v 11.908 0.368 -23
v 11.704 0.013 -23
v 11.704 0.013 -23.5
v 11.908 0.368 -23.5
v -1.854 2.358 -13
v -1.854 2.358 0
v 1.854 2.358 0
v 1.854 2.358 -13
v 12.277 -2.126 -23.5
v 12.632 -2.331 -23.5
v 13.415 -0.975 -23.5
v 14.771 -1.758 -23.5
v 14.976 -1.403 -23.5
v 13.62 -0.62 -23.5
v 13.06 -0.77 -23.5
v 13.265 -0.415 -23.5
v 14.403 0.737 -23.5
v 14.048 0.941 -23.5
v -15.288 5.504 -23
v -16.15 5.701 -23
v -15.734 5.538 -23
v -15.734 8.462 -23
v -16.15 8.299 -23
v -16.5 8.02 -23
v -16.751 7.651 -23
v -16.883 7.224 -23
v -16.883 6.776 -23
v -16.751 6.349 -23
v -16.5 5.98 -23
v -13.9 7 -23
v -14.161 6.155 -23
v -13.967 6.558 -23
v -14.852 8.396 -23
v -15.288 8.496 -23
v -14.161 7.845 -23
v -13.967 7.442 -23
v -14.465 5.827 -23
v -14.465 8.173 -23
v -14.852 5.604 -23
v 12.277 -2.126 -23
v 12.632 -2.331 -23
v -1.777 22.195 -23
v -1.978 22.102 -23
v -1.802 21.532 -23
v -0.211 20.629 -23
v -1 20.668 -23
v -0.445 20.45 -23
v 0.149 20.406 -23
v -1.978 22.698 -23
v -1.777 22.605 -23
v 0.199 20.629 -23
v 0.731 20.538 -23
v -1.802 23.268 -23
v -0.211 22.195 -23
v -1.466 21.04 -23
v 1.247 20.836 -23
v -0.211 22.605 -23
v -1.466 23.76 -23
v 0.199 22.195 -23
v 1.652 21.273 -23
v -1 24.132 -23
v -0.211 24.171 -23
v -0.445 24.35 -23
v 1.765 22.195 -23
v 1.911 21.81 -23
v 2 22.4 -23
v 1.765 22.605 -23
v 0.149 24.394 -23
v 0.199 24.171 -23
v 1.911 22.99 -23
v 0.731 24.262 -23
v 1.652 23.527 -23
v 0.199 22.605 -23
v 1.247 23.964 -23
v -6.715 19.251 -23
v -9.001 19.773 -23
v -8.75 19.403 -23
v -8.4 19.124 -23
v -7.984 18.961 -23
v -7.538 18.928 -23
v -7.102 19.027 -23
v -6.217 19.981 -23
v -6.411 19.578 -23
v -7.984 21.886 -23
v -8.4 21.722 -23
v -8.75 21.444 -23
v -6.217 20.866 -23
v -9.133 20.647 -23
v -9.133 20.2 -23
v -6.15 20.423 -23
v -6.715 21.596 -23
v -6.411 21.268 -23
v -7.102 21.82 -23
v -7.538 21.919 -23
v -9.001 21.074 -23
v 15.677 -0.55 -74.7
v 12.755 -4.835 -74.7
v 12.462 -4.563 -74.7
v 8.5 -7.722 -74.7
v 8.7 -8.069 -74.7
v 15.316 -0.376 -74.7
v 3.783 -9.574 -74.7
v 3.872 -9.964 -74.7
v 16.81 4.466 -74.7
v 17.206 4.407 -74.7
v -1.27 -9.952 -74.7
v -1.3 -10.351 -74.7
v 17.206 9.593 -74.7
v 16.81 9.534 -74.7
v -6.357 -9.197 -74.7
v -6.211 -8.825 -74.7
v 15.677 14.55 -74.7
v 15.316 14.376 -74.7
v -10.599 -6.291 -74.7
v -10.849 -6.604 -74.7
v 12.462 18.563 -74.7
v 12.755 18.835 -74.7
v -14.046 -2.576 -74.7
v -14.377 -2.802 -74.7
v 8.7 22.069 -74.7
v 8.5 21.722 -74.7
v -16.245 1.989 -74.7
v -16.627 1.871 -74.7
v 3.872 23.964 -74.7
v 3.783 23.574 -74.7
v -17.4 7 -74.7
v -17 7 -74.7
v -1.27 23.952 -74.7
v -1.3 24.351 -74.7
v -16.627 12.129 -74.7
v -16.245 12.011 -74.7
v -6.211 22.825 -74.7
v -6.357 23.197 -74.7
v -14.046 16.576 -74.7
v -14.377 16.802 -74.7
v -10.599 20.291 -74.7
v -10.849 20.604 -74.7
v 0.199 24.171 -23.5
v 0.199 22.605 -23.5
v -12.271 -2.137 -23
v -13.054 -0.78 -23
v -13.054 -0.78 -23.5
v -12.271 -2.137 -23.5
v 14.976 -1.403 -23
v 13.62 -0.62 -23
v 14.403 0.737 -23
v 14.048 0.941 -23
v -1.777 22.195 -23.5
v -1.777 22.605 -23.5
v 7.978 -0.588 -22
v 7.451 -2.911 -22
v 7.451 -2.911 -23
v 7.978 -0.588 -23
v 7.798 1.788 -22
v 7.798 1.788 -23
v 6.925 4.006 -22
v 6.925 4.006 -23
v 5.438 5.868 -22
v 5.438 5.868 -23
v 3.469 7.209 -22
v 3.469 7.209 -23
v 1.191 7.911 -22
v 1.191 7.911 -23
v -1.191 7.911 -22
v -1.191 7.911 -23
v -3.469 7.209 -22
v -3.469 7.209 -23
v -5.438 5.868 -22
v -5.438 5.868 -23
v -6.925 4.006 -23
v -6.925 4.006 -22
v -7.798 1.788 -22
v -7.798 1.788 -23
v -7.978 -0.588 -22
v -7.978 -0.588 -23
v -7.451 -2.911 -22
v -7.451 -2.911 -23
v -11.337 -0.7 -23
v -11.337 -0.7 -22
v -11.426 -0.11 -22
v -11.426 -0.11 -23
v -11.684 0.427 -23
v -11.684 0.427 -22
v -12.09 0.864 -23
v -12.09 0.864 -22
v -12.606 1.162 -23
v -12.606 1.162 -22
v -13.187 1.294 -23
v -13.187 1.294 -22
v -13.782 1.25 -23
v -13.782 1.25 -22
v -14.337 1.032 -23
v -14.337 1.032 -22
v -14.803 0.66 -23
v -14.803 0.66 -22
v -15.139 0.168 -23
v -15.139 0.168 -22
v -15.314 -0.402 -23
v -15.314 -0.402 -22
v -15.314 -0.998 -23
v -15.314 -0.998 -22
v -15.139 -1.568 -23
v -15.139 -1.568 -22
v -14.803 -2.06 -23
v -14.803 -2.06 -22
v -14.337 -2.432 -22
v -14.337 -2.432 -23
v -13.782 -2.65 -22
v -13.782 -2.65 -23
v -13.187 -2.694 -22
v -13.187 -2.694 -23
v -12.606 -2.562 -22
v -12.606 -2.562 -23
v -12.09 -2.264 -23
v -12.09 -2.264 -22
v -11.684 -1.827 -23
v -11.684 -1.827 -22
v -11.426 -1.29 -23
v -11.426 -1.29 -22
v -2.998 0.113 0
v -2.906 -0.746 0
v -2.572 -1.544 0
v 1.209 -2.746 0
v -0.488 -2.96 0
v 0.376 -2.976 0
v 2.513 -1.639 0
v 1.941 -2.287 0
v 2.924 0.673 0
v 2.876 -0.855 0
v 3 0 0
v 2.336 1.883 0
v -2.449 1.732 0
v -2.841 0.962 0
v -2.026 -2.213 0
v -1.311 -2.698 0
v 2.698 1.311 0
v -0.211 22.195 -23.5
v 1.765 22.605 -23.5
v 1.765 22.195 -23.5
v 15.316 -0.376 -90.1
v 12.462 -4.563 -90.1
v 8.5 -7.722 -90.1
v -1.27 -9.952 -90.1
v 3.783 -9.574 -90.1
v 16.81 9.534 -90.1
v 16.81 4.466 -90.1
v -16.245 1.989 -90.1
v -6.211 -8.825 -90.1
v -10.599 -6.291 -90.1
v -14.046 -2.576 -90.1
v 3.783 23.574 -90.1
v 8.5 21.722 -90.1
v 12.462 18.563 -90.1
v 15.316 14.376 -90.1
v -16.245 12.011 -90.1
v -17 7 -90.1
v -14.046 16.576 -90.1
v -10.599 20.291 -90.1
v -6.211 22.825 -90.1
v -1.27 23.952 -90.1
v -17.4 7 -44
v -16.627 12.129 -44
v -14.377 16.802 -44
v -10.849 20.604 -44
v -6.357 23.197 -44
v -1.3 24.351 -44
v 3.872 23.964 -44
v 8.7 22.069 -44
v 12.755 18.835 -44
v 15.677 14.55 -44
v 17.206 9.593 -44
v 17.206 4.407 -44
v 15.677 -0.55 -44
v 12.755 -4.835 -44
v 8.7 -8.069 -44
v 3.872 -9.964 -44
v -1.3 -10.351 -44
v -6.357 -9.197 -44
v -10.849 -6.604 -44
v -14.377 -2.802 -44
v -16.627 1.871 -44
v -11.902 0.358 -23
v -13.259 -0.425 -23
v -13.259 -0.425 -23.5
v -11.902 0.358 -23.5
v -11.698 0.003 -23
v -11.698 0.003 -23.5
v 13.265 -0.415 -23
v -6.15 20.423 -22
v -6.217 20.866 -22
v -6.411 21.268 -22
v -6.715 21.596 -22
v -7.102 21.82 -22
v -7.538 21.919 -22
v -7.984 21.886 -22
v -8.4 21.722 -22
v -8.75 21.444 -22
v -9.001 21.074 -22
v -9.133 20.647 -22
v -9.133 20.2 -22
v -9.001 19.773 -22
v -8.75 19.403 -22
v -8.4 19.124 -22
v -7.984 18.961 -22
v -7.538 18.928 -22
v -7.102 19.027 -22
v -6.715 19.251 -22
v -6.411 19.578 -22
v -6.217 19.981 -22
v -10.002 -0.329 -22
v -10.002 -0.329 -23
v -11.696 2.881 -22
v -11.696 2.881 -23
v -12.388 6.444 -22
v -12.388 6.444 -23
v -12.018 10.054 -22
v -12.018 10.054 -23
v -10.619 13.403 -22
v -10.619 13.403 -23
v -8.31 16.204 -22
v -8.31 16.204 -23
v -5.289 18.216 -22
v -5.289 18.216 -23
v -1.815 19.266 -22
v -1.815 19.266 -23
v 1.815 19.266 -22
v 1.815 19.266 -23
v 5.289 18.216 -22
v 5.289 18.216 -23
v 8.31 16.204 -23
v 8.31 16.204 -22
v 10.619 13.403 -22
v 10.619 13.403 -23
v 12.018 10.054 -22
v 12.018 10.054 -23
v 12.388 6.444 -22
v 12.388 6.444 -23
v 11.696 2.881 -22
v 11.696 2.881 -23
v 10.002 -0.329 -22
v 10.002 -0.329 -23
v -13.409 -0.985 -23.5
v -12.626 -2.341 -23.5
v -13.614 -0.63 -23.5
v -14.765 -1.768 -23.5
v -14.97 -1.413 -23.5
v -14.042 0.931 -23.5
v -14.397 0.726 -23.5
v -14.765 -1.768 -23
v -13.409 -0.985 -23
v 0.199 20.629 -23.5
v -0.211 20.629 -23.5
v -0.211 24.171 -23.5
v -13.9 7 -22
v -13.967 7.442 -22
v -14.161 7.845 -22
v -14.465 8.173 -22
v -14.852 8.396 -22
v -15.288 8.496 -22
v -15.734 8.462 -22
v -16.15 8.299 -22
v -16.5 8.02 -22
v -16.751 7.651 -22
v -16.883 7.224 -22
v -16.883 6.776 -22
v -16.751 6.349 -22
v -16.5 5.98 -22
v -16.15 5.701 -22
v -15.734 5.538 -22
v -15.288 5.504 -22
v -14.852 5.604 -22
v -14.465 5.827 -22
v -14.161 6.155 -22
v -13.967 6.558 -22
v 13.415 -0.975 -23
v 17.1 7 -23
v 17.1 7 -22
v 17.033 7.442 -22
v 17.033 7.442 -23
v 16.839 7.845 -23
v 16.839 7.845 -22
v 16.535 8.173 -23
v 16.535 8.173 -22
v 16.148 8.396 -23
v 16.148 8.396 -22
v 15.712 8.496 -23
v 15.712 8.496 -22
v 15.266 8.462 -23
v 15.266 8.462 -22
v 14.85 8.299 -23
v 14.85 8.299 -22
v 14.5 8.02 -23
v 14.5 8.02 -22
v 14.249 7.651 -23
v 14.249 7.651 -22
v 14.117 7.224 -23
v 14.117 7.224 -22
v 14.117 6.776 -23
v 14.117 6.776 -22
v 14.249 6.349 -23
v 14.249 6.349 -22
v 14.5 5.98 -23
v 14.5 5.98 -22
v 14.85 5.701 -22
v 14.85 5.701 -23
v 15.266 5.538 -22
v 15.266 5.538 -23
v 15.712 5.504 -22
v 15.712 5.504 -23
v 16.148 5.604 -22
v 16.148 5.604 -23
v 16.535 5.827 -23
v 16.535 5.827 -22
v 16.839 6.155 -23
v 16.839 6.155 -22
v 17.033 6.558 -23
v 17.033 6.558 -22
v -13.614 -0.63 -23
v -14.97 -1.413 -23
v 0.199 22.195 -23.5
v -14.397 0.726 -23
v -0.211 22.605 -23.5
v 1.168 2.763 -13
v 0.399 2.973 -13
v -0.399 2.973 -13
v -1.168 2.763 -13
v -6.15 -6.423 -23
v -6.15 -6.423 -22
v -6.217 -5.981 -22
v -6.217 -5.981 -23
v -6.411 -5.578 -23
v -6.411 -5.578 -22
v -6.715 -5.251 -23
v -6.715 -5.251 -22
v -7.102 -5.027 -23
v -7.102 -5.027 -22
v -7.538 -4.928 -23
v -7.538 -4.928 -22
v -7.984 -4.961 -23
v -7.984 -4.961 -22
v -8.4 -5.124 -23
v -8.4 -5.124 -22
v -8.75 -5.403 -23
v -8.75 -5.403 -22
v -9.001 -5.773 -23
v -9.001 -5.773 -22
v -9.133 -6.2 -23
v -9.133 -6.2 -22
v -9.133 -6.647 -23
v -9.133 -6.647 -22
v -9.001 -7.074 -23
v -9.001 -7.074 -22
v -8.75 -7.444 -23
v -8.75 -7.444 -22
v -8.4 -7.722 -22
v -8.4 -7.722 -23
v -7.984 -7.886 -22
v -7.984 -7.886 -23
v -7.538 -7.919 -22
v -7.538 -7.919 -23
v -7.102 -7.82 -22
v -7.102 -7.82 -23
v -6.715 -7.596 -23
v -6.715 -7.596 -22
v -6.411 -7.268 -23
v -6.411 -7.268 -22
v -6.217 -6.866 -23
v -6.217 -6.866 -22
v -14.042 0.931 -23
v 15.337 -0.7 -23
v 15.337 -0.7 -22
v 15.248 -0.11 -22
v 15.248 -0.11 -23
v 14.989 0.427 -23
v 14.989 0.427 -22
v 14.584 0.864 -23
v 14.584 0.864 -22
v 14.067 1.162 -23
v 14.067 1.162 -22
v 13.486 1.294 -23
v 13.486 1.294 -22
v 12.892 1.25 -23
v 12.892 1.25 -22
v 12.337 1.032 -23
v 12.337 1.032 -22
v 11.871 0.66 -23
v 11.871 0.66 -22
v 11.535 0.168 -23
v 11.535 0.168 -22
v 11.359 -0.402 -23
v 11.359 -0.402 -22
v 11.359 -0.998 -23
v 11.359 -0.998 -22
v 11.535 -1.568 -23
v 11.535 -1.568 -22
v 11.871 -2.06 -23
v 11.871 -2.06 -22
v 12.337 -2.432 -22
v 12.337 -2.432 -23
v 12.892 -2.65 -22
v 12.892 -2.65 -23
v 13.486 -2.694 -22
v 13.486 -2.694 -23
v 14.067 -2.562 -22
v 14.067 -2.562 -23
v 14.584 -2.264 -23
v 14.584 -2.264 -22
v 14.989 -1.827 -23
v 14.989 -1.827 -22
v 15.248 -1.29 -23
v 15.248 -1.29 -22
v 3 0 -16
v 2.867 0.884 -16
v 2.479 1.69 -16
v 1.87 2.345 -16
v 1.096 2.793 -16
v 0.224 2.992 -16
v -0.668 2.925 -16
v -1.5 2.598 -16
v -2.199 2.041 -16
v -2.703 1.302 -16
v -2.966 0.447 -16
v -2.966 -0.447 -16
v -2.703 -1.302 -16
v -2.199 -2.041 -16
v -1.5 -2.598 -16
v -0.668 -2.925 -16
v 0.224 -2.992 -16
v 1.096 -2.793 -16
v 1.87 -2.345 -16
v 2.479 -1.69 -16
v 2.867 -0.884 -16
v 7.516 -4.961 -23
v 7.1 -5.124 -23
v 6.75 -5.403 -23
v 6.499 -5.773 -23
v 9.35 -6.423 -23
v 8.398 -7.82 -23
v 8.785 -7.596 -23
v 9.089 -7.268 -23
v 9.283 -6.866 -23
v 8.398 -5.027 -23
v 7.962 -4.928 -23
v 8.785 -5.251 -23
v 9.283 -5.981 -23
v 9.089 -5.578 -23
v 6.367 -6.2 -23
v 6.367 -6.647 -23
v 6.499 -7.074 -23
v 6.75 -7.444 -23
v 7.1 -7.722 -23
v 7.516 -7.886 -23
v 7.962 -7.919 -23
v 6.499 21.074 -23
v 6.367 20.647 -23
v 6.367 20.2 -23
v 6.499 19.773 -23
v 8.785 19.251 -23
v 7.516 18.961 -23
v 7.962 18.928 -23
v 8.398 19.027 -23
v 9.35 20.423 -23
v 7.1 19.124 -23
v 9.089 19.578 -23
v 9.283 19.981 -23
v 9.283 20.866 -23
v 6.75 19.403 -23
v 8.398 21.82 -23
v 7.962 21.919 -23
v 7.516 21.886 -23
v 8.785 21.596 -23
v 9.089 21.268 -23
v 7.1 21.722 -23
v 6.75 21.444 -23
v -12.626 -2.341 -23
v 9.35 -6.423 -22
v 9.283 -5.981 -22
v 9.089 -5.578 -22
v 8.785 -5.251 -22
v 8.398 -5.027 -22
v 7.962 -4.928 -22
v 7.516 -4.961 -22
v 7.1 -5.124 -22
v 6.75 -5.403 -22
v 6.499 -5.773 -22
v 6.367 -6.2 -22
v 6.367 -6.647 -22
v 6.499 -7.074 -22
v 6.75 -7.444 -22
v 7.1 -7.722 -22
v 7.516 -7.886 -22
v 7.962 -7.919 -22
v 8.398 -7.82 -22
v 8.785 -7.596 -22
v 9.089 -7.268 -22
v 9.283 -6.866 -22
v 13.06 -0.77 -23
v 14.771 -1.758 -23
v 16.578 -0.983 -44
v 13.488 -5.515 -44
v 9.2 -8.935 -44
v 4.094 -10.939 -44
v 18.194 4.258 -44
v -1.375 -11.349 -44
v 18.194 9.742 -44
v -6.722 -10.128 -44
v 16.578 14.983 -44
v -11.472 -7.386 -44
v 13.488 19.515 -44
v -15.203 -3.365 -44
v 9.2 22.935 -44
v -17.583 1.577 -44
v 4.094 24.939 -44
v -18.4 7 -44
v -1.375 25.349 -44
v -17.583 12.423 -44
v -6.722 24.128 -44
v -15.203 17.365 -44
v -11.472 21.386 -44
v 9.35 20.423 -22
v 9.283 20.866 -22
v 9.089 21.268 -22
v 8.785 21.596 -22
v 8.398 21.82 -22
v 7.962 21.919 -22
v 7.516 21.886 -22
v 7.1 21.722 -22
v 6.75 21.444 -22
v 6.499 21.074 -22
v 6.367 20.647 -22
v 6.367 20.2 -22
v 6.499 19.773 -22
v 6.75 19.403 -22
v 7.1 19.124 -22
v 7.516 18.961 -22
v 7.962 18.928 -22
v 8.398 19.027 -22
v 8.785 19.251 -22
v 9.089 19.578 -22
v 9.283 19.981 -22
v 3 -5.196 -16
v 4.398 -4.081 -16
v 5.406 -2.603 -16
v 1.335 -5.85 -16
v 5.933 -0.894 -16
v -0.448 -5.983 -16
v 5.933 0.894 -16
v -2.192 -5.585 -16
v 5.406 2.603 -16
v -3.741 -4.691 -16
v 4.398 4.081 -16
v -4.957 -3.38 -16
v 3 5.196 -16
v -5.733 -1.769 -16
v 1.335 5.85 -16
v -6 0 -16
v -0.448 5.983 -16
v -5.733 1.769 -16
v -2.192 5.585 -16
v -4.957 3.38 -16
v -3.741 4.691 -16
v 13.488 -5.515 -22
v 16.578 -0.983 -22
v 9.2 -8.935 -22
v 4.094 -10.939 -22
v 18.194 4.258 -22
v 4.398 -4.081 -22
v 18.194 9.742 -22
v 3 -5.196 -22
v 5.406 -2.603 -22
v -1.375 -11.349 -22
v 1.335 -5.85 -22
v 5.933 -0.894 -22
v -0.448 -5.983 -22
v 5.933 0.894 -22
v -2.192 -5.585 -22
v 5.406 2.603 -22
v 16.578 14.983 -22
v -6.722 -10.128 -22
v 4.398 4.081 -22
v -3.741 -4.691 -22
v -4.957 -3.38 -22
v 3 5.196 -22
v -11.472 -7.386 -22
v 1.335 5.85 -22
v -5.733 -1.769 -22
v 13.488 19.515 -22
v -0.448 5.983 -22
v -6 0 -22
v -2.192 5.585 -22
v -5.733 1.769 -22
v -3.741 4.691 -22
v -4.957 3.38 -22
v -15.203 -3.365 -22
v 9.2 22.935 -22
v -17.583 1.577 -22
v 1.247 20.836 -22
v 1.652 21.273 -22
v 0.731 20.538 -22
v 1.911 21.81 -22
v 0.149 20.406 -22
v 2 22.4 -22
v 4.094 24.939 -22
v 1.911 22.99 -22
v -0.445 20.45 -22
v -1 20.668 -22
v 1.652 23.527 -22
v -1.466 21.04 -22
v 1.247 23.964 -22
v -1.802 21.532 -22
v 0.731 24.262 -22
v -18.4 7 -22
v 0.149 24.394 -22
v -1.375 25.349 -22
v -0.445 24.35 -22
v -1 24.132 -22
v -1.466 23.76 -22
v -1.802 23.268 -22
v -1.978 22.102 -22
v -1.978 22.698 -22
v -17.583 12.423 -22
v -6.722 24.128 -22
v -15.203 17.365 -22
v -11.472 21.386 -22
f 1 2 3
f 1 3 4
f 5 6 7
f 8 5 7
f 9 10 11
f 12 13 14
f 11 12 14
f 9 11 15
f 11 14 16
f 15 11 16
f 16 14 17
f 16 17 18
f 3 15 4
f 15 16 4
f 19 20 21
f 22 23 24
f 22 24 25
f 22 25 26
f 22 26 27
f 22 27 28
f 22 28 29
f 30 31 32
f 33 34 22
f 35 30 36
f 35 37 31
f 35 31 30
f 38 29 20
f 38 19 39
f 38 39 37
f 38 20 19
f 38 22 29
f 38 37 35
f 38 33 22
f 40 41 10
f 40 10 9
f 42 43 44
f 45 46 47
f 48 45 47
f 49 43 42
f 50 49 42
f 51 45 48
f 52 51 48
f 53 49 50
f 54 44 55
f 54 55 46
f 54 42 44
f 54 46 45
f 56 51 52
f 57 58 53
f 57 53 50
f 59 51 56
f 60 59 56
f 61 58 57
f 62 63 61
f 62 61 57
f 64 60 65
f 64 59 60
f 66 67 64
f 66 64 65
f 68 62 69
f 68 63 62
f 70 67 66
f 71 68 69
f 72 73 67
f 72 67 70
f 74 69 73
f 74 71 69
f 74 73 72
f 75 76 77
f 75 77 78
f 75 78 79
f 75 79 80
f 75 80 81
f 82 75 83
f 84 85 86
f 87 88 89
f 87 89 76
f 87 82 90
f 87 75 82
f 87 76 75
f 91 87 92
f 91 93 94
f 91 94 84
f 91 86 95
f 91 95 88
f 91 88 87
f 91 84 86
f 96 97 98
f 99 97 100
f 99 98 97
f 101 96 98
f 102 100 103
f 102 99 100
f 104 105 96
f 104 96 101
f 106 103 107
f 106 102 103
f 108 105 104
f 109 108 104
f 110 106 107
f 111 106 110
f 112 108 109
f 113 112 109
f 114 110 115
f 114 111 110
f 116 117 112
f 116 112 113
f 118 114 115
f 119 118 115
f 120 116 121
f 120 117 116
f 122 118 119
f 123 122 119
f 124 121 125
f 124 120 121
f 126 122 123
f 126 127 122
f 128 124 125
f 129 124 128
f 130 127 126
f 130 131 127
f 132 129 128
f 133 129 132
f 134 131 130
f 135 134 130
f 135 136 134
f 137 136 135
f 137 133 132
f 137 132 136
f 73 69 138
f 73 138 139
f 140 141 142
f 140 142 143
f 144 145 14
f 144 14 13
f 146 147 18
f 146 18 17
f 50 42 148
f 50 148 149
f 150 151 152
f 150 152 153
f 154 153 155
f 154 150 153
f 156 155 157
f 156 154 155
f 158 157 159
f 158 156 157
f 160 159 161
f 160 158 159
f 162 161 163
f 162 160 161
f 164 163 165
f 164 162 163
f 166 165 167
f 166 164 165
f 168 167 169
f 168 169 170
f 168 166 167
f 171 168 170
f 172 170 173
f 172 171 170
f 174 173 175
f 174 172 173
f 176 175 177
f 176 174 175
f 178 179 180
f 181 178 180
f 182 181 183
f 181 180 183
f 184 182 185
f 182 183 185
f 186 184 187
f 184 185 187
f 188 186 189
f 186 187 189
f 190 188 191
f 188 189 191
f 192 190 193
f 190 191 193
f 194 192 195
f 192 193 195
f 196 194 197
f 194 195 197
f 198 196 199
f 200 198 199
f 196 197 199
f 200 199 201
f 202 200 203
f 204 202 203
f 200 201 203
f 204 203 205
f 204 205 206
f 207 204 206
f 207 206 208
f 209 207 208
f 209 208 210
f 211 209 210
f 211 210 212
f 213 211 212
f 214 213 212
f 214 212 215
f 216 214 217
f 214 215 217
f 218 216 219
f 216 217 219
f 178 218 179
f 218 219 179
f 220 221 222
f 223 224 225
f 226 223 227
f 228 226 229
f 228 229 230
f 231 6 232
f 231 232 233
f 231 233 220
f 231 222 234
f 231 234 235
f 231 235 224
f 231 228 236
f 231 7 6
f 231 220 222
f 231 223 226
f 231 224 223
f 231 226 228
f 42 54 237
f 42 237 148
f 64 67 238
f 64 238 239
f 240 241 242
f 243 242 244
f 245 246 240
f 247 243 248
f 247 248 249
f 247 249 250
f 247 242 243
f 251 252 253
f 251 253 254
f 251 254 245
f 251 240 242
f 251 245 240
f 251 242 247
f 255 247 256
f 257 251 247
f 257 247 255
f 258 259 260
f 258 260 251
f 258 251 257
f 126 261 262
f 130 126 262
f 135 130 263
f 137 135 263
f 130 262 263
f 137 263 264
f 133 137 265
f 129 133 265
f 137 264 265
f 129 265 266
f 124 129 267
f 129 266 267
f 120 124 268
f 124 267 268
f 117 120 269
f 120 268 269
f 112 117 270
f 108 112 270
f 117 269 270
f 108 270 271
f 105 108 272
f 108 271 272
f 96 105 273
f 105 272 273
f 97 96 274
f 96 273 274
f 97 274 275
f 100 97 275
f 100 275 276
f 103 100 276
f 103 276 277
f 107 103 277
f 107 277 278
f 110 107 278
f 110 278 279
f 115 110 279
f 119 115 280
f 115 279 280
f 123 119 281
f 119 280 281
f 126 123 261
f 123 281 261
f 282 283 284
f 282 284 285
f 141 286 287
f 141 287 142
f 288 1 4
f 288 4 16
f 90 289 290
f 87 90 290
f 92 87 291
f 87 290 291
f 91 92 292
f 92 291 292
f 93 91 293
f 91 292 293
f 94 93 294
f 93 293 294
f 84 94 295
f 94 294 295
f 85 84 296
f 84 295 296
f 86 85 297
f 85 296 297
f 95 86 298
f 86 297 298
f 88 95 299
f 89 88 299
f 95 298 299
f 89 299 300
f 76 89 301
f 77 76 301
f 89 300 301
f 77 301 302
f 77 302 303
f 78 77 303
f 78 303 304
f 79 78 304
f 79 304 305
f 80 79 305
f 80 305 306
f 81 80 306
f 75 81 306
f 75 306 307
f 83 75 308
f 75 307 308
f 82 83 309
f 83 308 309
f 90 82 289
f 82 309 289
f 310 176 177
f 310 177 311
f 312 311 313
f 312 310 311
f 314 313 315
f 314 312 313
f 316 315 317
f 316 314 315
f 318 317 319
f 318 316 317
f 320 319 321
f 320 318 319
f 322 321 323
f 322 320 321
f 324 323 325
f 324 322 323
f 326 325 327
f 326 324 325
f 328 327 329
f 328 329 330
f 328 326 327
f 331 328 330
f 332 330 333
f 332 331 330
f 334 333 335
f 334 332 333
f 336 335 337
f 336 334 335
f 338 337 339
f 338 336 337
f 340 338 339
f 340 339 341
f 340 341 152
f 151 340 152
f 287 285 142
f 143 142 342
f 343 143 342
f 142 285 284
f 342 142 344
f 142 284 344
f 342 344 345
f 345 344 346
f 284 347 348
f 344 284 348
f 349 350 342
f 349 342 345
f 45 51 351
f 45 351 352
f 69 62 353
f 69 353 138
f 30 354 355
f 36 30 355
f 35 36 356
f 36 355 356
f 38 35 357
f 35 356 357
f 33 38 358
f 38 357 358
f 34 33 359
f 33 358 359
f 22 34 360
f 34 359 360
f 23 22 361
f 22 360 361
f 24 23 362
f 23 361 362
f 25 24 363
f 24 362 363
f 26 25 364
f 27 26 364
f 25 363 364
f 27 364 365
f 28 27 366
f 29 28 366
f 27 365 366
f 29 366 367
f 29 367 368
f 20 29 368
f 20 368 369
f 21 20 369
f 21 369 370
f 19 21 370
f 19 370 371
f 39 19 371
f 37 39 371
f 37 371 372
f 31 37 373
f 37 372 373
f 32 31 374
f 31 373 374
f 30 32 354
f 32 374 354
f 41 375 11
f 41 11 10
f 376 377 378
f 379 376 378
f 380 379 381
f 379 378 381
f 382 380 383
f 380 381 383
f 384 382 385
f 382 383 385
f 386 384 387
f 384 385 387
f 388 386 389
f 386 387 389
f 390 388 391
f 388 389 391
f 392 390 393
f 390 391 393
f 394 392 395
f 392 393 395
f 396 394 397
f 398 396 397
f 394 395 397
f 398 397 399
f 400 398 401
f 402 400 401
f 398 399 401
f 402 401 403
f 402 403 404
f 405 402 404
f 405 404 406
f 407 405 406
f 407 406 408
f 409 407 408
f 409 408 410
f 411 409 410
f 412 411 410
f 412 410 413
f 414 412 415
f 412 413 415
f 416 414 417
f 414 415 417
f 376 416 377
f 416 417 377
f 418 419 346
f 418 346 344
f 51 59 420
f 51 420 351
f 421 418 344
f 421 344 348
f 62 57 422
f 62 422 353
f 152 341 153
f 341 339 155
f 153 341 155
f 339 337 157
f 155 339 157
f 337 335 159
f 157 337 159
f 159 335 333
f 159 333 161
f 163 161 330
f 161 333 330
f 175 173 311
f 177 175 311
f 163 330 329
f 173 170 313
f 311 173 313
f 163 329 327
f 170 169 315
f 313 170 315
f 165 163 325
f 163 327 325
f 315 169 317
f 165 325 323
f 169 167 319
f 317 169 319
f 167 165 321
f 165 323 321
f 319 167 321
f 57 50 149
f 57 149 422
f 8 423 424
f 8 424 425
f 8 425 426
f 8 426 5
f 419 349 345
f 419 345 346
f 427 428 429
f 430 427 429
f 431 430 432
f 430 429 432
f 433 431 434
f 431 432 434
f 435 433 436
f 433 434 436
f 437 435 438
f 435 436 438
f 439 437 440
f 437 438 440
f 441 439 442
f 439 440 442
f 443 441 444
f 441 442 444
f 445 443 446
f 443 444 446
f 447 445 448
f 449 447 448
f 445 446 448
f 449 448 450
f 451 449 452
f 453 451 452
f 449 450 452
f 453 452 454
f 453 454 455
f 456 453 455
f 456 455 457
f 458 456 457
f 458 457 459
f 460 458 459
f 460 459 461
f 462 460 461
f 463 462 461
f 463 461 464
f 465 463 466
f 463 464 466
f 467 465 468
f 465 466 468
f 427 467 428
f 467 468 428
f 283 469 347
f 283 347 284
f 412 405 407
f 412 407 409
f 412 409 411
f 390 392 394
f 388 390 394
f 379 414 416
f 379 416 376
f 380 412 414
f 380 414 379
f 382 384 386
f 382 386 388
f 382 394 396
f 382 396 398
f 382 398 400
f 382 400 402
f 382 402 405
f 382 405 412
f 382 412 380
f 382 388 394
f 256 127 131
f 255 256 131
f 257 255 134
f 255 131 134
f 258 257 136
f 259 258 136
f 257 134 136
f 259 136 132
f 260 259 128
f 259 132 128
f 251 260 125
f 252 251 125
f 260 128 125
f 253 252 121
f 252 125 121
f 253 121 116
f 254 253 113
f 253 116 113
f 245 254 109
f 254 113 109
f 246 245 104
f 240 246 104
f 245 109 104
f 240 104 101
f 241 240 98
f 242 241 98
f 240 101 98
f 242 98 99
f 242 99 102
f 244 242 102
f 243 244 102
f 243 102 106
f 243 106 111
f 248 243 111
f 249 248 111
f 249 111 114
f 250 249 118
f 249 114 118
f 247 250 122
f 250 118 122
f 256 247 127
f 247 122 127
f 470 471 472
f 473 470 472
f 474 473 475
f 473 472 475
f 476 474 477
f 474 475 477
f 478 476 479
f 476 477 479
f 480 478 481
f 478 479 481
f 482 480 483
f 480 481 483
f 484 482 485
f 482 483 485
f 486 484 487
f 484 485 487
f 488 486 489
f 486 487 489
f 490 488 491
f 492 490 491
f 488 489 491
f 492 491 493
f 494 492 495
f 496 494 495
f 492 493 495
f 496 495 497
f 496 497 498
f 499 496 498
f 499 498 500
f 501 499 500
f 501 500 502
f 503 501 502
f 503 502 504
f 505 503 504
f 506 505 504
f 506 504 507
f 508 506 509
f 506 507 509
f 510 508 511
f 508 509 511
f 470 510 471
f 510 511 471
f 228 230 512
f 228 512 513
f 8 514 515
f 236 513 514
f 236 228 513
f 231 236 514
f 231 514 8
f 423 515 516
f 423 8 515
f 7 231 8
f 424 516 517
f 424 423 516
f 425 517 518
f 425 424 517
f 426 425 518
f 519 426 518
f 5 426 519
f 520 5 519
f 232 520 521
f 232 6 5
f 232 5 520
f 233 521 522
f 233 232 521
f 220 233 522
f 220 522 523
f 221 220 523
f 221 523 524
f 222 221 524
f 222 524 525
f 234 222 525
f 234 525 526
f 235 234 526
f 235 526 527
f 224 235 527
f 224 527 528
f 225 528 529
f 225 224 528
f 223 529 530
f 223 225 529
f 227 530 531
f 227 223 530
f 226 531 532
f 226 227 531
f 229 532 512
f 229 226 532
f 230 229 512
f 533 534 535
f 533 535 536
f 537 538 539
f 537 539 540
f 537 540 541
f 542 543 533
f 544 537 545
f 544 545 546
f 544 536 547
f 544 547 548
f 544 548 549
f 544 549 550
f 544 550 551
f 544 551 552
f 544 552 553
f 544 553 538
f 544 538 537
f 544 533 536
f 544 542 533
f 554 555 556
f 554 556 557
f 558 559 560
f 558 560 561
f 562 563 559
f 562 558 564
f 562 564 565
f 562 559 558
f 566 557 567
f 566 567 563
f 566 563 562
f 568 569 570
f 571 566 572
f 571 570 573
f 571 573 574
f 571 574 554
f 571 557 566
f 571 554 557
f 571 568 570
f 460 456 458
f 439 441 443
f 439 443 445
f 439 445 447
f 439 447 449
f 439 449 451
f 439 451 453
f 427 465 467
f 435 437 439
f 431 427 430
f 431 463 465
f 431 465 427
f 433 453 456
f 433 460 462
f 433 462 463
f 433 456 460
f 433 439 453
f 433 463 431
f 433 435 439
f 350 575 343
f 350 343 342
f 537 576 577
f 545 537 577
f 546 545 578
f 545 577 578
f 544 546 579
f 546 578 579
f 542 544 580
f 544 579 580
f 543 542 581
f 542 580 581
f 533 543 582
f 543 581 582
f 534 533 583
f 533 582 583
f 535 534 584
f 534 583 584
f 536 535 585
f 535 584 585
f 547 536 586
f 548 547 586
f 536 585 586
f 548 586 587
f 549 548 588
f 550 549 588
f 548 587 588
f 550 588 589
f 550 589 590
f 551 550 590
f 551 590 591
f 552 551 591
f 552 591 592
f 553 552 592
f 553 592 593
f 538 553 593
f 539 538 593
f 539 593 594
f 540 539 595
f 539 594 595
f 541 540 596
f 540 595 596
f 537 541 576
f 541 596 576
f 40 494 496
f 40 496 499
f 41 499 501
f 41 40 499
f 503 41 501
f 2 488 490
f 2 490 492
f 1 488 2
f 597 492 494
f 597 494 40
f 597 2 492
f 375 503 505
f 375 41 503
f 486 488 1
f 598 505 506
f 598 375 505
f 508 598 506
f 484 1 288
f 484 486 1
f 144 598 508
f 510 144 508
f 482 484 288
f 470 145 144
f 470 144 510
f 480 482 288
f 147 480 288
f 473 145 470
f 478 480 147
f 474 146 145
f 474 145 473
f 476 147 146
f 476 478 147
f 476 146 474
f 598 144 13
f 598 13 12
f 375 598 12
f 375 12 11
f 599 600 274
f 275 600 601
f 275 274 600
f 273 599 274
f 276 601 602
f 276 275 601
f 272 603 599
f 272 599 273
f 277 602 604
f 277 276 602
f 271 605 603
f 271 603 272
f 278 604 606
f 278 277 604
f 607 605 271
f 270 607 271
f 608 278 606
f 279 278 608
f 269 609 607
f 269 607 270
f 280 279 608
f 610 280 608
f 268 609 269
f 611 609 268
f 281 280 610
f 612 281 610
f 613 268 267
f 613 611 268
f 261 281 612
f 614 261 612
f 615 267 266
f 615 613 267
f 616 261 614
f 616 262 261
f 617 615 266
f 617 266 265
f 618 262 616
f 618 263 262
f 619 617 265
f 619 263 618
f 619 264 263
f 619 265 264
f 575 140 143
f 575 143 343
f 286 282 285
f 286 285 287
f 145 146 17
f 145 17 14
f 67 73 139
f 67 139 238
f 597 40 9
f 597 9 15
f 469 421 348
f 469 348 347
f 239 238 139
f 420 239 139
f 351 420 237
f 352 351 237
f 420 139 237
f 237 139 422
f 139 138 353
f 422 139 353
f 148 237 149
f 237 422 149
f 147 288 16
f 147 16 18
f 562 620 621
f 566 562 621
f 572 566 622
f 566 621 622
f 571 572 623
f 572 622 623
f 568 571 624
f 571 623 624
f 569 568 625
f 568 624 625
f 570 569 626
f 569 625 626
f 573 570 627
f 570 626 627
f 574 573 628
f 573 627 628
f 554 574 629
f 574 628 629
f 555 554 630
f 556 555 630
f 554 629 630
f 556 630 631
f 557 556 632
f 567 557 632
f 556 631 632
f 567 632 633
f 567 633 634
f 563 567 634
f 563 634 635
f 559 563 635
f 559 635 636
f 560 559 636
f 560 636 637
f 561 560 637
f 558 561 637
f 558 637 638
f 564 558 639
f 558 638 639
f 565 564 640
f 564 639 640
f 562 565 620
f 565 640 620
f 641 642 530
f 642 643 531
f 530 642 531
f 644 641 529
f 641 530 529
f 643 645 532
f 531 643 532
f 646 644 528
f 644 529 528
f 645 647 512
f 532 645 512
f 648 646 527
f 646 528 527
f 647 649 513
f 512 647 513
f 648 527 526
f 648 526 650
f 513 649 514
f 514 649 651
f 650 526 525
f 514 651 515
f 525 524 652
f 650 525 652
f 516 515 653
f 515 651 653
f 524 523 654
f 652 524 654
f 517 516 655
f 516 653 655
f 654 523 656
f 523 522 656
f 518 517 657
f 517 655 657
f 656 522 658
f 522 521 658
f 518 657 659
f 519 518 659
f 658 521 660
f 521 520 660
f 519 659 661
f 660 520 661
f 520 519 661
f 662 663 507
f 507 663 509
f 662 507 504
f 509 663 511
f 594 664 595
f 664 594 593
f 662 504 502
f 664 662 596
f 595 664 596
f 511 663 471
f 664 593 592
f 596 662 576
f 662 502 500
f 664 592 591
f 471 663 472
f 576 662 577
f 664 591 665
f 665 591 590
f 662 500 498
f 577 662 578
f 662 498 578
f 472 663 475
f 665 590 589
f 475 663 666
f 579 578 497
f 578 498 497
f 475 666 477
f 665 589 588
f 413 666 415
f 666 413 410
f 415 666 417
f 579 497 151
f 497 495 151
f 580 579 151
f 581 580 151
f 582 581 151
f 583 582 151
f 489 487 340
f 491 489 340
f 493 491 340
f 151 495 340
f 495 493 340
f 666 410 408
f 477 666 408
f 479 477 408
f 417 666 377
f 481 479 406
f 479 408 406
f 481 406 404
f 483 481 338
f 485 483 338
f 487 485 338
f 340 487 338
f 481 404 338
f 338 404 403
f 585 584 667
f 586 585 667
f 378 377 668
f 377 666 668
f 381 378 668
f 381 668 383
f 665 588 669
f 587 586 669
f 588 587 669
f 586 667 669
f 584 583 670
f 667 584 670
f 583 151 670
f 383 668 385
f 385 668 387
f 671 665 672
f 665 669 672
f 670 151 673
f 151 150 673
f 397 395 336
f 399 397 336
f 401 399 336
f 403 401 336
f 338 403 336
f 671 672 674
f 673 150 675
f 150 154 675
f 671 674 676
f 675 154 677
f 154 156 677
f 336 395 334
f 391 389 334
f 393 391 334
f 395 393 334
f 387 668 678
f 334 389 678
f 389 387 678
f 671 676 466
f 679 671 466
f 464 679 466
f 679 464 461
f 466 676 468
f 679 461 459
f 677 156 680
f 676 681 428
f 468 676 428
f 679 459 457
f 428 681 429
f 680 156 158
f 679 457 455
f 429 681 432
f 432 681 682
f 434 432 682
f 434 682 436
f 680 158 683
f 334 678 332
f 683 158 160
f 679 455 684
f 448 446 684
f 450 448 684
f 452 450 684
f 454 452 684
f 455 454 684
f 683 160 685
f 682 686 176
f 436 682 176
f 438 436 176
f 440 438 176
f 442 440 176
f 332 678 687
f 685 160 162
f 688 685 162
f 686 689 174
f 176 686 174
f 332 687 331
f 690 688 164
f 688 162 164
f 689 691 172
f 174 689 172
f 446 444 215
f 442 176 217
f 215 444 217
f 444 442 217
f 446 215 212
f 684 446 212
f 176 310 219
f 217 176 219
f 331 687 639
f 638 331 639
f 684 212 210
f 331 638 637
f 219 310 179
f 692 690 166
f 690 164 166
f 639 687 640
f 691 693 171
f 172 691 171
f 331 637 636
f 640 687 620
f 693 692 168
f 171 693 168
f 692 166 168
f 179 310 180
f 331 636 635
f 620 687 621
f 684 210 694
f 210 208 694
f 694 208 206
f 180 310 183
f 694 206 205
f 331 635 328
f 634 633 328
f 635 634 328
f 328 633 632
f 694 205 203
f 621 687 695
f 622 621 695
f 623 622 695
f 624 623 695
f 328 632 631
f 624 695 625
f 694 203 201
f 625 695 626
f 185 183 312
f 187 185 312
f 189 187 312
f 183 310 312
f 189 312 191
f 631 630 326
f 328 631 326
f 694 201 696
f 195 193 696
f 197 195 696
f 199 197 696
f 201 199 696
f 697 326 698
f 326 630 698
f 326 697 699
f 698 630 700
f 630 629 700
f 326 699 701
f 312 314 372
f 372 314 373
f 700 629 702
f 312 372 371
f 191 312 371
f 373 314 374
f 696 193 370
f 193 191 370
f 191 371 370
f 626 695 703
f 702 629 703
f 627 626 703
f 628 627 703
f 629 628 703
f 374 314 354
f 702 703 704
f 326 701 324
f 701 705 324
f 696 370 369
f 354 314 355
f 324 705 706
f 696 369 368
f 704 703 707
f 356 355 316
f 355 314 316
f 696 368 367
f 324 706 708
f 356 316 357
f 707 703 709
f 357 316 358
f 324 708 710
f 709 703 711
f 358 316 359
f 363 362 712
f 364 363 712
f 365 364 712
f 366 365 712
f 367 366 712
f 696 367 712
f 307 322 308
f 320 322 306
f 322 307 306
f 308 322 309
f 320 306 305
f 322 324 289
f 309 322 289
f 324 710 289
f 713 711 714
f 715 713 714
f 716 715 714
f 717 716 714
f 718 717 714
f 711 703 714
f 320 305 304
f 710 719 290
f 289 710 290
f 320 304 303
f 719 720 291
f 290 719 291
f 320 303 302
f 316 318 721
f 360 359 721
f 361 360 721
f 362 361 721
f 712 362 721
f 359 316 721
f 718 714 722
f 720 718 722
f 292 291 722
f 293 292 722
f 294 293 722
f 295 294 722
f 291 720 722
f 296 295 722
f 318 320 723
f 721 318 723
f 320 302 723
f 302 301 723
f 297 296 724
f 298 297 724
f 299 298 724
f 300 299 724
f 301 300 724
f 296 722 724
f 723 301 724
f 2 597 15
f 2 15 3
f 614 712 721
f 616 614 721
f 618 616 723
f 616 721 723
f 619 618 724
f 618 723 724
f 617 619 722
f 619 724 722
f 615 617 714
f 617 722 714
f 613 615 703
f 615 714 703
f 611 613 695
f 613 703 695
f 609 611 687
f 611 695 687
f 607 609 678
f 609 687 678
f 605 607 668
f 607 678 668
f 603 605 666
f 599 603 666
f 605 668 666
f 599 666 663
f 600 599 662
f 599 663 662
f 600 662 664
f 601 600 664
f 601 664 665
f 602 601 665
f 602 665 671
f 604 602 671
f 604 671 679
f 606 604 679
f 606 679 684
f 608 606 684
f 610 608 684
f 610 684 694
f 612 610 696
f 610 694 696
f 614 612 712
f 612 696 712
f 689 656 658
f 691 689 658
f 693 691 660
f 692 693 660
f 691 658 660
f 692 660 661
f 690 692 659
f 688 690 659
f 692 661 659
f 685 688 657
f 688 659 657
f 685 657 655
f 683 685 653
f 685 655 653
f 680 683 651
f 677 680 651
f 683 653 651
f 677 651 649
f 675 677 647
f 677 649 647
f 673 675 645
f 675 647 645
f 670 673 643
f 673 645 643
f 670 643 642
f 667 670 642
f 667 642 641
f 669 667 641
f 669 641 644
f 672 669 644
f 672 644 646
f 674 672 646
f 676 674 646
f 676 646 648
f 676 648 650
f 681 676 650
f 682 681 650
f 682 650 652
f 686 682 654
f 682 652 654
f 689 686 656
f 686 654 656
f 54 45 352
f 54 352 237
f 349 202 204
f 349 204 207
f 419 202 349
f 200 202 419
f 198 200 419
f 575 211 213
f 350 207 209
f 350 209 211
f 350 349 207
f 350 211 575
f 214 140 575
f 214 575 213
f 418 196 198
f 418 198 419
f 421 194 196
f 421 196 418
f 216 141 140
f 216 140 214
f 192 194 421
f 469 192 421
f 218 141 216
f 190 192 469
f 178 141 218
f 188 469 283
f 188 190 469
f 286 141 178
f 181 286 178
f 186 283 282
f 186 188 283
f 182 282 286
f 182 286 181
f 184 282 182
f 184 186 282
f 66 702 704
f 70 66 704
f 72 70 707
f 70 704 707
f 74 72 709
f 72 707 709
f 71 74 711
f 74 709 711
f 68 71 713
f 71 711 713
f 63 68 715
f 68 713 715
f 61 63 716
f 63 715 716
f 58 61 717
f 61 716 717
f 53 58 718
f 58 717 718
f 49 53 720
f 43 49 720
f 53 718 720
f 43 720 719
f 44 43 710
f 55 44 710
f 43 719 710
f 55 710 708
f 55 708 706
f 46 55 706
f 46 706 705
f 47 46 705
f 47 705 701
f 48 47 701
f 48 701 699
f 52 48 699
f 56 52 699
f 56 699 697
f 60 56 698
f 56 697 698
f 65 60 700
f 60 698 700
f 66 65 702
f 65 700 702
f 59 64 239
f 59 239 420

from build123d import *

# Parameters (mm, degrees)
SKETCH1_R           = 3
BOSS_EXTRUDE1_DEPTH = 16
CUT_EXTRUDE1_DEPTH  = 13
SKETCH4_R           = 6
BOSS_EXTRUDE2_DEPTH = 6
SKETCH5_R           = 18.4
BOSS_EXTRUDE3_DEPTH = 22
SKETCH6_R           = 17.4
BOSS_EXTRUDE4_DEPTH = 30.7
SKETCH7_R           = 17
BOSS_EXTRUDE5_DEPTH = 15.4
SKETCH8_R           = 2
SKETCH8_R_2         = 1.5
CUT_EXTRUDE2_DEPTH  = 1
CUT_EXTRUDE3_DEPTH  = 1
CUT_EXTRUDE4_DEPTH  = 0.5


with BuildPart() as part:
    # Sketch1 → Boss-Extrude1 (new body)
    with BuildSketch(Plane.XY):
        Circle(SKETCH1_R)
    extrude(amount=-BOSS_EXTRUDE1_DEPTH)

    # Sketch2 → Cut-Extrude1 (cut)
    with BuildSketch(Plane.XY):
        with BuildLine():
            Line((-1.854051563, 2.358493757), (1.854051563, 2.358493757))
            ThreePointArc((1.854051563, 2.358493757), (0, 3), (-1.854051563, 2.358493757))
        make_face()
    extrude(amount=-CUT_EXTRUDE1_DEPTH, mode=Mode.SUBTRACT)

    # Sketch4 → Boss-Extrude2 (add)
    with BuildSketch(Plane(origin=(0, 0, -16), x_dir=(-1, 0, 0), z_dir=(0, 0, -1))):
        Circle(SKETCH4_R)
    extrude(amount=BOSS_EXTRUDE2_DEPTH)

    # Sketch5 → Boss-Extrude3 (add)
    with BuildSketch(Plane(origin=(0, 0, -22), x_dir=(-1, 0, 0), z_dir=(0, 0, -1))):
        with Locations((0, 7)):
            Circle(SKETCH5_R)
    extrude(amount=BOSS_EXTRUDE3_DEPTH)

    # Sketch6 → Boss-Extrude4 (add)
    with BuildSketch(Plane(origin=(0, 0, -44), x_dir=(-1, 0, 0), z_dir=(0, 0, -1))):
        with Locations((0, 7)):
            Circle(SKETCH6_R)
    extrude(amount=BOSS_EXTRUDE4_DEPTH)

    # Sketch7 → Boss-Extrude5 (add)
    with BuildSketch(Plane(origin=(0, 0, -74.7), x_dir=(-1, 0, 0), z_dir=(0, 0, -1))):
        with Locations((0, 7)):
            Circle(SKETCH7_R)
    extrude(amount=BOSS_EXTRUDE5_DEPTH)

    # Sketch8 → Cut-Extrude2 (cut)
    with BuildSketch(Plane.XY.offset(-22)):
        with Locations((0, 22.4)):
            Circle(SKETCH8_R)
        with Locations((13.336791218, -0.7)):
            Circle(SKETCH8_R)
        with Locations((-13.336791218, -0.7)):
            Circle(SKETCH8_R)
        with Locations((-15.4, 7)):
            Circle(SKETCH8_R_2)
        with Locations((-7.65, 20.423393759)):
            Circle(SKETCH8_R_2)
        with Locations((7.85, 20.423393759)):
            Circle(SKETCH8_R_2)
        with Locations((15.6, 7)):
            Circle(SKETCH8_R_2)
        with Locations((7.85, -6.423393759)):
            Circle(SKETCH8_R_2)
        with Locations((-7.65, -6.423393759)):
            Circle(SKETCH8_R_2)
    extrude(amount=-CUT_EXTRUDE2_DEPTH, mode=Mode.SUBTRACT)

    # Sketch9 → Cut-Extrude3 (cut)
    with BuildSketch(Plane.XY.offset(-22)):
        with BuildLine():
            ThreePointArc((7.451414877, -2.911428571), (0, 8), (-7.451414877, -2.911428571))
            ThreePointArc((-7.451414877, -2.911428571), (0, 19.4), (7.451414877, -2.911428571))
        make_face()
    extrude(amount=-CUT_EXTRUDE3_DEPTH, mode=Mode.SUBTRACT)

    # Sketch10 → Cut-Extrude4 (cut)
    with BuildSketch(Plane.XY.offset(-23)):
        Polygon((0.198821757, 22.604844617), (1.765091395, 22.604844617), (1.765091395, 22.195155383), (0.198821757, 22.195155383), (0.198821757, 20.628885745), (-0.210867478, 20.628885745), (-0.210867478, 22.195155383), (-1.777137116, 22.195155383), (-1.777137116, 22.604844617), (-0.210867478, 22.604844617), (-0.210867478, 24.171114255), (0.198821757, 24.171114255), align=None)
        Polygon((13.414780982, -0.974607001), (12.631646163, -2.331036297), (12.276844878, -2.126191679), (13.059979697, -0.769762384), (11.703550402, 0.013372435), (11.908395019, 0.36817372), (13.264824315, -0.414961099), (14.047959134, 0.941468197), (14.402760419, 0.736623579), (13.6196256, -0.619805716), (14.976054895, -1.402940535), (14.771210278, -1.75774182), align=None)
        Polygon((-13.613602739, -0.630237616), (-14.396737558, 0.726191679), (-14.041936273, 0.931036297), (-13.258801454, -0.425392999), (-11.902372159, 0.35774182), (-11.697527541, 0.002940535), (-13.053956837, -0.780194284), (-12.270822018, -2.136623579), (-12.625623303, -2.341468197), (-13.408758122, -0.985038901), (-14.765187417, -1.76817372), (-14.970032035, -1.413372435), align=None)
    extrude(amount=-CUT_EXTRUDE4_DEPTH, mode=Mode.SUBTRACT)


solid = part.part
